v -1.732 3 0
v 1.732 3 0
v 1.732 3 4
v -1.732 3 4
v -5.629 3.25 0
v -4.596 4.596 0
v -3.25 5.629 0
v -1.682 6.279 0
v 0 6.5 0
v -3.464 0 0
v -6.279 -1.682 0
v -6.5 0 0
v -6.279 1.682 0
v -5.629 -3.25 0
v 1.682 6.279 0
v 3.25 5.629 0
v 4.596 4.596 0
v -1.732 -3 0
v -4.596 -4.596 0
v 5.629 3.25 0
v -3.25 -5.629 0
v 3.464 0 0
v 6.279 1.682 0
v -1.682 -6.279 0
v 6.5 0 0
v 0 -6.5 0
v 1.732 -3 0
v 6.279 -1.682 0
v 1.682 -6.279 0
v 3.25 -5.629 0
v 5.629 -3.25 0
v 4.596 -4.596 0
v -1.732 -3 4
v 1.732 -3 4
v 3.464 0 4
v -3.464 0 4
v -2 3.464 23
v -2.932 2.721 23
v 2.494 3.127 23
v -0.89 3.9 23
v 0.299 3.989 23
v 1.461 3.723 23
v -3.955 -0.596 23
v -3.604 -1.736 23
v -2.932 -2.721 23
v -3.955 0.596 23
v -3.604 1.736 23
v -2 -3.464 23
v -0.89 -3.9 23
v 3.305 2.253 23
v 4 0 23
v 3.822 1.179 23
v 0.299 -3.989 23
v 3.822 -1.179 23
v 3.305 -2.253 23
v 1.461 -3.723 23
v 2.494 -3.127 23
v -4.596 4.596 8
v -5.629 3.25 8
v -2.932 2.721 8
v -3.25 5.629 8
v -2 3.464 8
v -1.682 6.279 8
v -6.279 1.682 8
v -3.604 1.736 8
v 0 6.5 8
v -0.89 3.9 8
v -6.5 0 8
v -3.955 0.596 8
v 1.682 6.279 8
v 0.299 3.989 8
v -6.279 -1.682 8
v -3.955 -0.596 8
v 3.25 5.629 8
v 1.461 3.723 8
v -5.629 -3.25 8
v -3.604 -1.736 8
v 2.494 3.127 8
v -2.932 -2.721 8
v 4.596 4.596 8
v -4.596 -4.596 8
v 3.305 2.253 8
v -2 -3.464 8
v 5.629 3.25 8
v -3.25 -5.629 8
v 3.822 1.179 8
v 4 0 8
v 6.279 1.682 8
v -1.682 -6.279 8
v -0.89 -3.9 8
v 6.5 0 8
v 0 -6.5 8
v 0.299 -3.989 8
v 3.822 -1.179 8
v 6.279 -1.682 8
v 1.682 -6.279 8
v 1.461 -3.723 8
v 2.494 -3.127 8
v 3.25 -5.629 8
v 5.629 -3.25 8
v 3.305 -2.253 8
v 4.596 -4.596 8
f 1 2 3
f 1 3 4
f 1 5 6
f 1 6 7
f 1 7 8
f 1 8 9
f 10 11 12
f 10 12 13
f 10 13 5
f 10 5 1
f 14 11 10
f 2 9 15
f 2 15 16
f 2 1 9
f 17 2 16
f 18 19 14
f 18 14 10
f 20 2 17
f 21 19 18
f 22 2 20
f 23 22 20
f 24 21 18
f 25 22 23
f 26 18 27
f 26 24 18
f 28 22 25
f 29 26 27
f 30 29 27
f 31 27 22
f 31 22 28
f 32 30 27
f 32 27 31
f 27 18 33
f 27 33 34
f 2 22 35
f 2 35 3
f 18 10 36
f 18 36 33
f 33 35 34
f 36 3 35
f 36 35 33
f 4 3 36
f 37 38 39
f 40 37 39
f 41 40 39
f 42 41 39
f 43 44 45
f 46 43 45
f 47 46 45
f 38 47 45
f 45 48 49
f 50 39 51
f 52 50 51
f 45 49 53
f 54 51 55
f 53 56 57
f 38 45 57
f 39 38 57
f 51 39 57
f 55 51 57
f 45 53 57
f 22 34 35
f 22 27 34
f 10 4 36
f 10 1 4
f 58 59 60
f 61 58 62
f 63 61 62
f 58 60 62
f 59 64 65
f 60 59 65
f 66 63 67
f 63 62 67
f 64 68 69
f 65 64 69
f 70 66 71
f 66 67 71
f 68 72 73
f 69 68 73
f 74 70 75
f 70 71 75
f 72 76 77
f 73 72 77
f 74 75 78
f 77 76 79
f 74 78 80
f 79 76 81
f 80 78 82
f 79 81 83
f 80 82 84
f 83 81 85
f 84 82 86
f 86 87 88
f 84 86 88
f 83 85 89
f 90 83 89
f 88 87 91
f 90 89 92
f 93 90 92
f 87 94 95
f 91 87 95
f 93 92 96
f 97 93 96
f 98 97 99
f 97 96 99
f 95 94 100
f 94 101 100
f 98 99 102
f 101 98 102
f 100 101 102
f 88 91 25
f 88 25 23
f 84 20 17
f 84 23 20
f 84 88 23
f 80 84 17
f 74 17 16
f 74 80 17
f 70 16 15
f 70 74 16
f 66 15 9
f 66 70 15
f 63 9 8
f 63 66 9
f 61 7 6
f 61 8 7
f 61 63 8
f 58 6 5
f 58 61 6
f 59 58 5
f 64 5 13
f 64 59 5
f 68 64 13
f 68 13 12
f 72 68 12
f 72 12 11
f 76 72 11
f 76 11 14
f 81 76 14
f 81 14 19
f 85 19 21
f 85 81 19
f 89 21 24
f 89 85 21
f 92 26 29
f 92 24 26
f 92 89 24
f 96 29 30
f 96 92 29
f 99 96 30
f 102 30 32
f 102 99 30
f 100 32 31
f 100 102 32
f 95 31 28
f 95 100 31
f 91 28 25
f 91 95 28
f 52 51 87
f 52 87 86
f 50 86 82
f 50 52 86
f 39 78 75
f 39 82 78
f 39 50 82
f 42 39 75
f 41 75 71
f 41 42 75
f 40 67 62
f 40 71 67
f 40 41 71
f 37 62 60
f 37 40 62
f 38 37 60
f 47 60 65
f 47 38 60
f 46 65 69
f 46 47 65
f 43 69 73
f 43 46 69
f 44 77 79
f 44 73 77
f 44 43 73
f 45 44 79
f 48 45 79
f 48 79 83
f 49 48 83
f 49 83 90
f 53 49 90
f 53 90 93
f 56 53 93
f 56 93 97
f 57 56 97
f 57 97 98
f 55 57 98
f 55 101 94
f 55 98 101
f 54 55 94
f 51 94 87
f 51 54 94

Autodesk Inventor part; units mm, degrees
ref_plane "YZ Plane" through (0, 0, 0) normal (1, 0, 0) x (0, 1, 0)
ref_plane "XZ Plane" through (0, 0, 0) normal (0, 1, 0) x (-1, 0, 0)
ref_plane "XY Plane" through (0, 0, 0) normal (0, 0, 1) x (1, 0, 0)
sketch "Sketch1" plane through (0, 0, 0) normal (0, 1, 0) x (-1, 0, 0)
  line L0 (0, 0) -> (-6.5, 0)
  line L1 (-6.5, 0) -> (-6.5, 8)
  line L2 (-6.5, 8) -> (-4, 8)
  line L3 (-4, 8) -> (-4, 23)
  line L4 (-4, 23) -> (0, 23)
  line L5 (0, 23) -> (0, 0)
  dimension "ScrewLength" = 15
  dimension "Diameter" = 13
  dimension "Metric" = 8
  dimension "HeadLength" = 8
revolve "Revolution1" add sketch "Sketch1" angle 360 about axis through (0, 0, 23) along (0, 0, -1)
thread "Thread1" size "M8x1.25" class "6g" standard "ANSI Metric M Profile" full length
sketch "Sketch2" plane through (0, 0, 0) normal (0, 0, -1) x (-1, 0, 0)
  line L0 (1.7321, 3) -> (3.4641, 0)
  line L1 (3.4641, 0) -> (1.7321, -3)
  line L2 (1.7321, -3) -> (-1.7321, -3)
  line L3 (-1.7321, -3) -> (-3.4641, 0)
  line L4 (-3.4641, 0) -> (-1.7321, 3)
  line L5 (-1.7321, 3) -> (1.7321, 3)
  point P0 (0, 0)
  point P1 (0, 0)
  dimension "WidthAcrossFlat" = 6
extrude "Extrusion1" cut sketch "Sketch2" against normal blind 4
properties part number "UC-0815" material "Stainless Steel AISI 304"
